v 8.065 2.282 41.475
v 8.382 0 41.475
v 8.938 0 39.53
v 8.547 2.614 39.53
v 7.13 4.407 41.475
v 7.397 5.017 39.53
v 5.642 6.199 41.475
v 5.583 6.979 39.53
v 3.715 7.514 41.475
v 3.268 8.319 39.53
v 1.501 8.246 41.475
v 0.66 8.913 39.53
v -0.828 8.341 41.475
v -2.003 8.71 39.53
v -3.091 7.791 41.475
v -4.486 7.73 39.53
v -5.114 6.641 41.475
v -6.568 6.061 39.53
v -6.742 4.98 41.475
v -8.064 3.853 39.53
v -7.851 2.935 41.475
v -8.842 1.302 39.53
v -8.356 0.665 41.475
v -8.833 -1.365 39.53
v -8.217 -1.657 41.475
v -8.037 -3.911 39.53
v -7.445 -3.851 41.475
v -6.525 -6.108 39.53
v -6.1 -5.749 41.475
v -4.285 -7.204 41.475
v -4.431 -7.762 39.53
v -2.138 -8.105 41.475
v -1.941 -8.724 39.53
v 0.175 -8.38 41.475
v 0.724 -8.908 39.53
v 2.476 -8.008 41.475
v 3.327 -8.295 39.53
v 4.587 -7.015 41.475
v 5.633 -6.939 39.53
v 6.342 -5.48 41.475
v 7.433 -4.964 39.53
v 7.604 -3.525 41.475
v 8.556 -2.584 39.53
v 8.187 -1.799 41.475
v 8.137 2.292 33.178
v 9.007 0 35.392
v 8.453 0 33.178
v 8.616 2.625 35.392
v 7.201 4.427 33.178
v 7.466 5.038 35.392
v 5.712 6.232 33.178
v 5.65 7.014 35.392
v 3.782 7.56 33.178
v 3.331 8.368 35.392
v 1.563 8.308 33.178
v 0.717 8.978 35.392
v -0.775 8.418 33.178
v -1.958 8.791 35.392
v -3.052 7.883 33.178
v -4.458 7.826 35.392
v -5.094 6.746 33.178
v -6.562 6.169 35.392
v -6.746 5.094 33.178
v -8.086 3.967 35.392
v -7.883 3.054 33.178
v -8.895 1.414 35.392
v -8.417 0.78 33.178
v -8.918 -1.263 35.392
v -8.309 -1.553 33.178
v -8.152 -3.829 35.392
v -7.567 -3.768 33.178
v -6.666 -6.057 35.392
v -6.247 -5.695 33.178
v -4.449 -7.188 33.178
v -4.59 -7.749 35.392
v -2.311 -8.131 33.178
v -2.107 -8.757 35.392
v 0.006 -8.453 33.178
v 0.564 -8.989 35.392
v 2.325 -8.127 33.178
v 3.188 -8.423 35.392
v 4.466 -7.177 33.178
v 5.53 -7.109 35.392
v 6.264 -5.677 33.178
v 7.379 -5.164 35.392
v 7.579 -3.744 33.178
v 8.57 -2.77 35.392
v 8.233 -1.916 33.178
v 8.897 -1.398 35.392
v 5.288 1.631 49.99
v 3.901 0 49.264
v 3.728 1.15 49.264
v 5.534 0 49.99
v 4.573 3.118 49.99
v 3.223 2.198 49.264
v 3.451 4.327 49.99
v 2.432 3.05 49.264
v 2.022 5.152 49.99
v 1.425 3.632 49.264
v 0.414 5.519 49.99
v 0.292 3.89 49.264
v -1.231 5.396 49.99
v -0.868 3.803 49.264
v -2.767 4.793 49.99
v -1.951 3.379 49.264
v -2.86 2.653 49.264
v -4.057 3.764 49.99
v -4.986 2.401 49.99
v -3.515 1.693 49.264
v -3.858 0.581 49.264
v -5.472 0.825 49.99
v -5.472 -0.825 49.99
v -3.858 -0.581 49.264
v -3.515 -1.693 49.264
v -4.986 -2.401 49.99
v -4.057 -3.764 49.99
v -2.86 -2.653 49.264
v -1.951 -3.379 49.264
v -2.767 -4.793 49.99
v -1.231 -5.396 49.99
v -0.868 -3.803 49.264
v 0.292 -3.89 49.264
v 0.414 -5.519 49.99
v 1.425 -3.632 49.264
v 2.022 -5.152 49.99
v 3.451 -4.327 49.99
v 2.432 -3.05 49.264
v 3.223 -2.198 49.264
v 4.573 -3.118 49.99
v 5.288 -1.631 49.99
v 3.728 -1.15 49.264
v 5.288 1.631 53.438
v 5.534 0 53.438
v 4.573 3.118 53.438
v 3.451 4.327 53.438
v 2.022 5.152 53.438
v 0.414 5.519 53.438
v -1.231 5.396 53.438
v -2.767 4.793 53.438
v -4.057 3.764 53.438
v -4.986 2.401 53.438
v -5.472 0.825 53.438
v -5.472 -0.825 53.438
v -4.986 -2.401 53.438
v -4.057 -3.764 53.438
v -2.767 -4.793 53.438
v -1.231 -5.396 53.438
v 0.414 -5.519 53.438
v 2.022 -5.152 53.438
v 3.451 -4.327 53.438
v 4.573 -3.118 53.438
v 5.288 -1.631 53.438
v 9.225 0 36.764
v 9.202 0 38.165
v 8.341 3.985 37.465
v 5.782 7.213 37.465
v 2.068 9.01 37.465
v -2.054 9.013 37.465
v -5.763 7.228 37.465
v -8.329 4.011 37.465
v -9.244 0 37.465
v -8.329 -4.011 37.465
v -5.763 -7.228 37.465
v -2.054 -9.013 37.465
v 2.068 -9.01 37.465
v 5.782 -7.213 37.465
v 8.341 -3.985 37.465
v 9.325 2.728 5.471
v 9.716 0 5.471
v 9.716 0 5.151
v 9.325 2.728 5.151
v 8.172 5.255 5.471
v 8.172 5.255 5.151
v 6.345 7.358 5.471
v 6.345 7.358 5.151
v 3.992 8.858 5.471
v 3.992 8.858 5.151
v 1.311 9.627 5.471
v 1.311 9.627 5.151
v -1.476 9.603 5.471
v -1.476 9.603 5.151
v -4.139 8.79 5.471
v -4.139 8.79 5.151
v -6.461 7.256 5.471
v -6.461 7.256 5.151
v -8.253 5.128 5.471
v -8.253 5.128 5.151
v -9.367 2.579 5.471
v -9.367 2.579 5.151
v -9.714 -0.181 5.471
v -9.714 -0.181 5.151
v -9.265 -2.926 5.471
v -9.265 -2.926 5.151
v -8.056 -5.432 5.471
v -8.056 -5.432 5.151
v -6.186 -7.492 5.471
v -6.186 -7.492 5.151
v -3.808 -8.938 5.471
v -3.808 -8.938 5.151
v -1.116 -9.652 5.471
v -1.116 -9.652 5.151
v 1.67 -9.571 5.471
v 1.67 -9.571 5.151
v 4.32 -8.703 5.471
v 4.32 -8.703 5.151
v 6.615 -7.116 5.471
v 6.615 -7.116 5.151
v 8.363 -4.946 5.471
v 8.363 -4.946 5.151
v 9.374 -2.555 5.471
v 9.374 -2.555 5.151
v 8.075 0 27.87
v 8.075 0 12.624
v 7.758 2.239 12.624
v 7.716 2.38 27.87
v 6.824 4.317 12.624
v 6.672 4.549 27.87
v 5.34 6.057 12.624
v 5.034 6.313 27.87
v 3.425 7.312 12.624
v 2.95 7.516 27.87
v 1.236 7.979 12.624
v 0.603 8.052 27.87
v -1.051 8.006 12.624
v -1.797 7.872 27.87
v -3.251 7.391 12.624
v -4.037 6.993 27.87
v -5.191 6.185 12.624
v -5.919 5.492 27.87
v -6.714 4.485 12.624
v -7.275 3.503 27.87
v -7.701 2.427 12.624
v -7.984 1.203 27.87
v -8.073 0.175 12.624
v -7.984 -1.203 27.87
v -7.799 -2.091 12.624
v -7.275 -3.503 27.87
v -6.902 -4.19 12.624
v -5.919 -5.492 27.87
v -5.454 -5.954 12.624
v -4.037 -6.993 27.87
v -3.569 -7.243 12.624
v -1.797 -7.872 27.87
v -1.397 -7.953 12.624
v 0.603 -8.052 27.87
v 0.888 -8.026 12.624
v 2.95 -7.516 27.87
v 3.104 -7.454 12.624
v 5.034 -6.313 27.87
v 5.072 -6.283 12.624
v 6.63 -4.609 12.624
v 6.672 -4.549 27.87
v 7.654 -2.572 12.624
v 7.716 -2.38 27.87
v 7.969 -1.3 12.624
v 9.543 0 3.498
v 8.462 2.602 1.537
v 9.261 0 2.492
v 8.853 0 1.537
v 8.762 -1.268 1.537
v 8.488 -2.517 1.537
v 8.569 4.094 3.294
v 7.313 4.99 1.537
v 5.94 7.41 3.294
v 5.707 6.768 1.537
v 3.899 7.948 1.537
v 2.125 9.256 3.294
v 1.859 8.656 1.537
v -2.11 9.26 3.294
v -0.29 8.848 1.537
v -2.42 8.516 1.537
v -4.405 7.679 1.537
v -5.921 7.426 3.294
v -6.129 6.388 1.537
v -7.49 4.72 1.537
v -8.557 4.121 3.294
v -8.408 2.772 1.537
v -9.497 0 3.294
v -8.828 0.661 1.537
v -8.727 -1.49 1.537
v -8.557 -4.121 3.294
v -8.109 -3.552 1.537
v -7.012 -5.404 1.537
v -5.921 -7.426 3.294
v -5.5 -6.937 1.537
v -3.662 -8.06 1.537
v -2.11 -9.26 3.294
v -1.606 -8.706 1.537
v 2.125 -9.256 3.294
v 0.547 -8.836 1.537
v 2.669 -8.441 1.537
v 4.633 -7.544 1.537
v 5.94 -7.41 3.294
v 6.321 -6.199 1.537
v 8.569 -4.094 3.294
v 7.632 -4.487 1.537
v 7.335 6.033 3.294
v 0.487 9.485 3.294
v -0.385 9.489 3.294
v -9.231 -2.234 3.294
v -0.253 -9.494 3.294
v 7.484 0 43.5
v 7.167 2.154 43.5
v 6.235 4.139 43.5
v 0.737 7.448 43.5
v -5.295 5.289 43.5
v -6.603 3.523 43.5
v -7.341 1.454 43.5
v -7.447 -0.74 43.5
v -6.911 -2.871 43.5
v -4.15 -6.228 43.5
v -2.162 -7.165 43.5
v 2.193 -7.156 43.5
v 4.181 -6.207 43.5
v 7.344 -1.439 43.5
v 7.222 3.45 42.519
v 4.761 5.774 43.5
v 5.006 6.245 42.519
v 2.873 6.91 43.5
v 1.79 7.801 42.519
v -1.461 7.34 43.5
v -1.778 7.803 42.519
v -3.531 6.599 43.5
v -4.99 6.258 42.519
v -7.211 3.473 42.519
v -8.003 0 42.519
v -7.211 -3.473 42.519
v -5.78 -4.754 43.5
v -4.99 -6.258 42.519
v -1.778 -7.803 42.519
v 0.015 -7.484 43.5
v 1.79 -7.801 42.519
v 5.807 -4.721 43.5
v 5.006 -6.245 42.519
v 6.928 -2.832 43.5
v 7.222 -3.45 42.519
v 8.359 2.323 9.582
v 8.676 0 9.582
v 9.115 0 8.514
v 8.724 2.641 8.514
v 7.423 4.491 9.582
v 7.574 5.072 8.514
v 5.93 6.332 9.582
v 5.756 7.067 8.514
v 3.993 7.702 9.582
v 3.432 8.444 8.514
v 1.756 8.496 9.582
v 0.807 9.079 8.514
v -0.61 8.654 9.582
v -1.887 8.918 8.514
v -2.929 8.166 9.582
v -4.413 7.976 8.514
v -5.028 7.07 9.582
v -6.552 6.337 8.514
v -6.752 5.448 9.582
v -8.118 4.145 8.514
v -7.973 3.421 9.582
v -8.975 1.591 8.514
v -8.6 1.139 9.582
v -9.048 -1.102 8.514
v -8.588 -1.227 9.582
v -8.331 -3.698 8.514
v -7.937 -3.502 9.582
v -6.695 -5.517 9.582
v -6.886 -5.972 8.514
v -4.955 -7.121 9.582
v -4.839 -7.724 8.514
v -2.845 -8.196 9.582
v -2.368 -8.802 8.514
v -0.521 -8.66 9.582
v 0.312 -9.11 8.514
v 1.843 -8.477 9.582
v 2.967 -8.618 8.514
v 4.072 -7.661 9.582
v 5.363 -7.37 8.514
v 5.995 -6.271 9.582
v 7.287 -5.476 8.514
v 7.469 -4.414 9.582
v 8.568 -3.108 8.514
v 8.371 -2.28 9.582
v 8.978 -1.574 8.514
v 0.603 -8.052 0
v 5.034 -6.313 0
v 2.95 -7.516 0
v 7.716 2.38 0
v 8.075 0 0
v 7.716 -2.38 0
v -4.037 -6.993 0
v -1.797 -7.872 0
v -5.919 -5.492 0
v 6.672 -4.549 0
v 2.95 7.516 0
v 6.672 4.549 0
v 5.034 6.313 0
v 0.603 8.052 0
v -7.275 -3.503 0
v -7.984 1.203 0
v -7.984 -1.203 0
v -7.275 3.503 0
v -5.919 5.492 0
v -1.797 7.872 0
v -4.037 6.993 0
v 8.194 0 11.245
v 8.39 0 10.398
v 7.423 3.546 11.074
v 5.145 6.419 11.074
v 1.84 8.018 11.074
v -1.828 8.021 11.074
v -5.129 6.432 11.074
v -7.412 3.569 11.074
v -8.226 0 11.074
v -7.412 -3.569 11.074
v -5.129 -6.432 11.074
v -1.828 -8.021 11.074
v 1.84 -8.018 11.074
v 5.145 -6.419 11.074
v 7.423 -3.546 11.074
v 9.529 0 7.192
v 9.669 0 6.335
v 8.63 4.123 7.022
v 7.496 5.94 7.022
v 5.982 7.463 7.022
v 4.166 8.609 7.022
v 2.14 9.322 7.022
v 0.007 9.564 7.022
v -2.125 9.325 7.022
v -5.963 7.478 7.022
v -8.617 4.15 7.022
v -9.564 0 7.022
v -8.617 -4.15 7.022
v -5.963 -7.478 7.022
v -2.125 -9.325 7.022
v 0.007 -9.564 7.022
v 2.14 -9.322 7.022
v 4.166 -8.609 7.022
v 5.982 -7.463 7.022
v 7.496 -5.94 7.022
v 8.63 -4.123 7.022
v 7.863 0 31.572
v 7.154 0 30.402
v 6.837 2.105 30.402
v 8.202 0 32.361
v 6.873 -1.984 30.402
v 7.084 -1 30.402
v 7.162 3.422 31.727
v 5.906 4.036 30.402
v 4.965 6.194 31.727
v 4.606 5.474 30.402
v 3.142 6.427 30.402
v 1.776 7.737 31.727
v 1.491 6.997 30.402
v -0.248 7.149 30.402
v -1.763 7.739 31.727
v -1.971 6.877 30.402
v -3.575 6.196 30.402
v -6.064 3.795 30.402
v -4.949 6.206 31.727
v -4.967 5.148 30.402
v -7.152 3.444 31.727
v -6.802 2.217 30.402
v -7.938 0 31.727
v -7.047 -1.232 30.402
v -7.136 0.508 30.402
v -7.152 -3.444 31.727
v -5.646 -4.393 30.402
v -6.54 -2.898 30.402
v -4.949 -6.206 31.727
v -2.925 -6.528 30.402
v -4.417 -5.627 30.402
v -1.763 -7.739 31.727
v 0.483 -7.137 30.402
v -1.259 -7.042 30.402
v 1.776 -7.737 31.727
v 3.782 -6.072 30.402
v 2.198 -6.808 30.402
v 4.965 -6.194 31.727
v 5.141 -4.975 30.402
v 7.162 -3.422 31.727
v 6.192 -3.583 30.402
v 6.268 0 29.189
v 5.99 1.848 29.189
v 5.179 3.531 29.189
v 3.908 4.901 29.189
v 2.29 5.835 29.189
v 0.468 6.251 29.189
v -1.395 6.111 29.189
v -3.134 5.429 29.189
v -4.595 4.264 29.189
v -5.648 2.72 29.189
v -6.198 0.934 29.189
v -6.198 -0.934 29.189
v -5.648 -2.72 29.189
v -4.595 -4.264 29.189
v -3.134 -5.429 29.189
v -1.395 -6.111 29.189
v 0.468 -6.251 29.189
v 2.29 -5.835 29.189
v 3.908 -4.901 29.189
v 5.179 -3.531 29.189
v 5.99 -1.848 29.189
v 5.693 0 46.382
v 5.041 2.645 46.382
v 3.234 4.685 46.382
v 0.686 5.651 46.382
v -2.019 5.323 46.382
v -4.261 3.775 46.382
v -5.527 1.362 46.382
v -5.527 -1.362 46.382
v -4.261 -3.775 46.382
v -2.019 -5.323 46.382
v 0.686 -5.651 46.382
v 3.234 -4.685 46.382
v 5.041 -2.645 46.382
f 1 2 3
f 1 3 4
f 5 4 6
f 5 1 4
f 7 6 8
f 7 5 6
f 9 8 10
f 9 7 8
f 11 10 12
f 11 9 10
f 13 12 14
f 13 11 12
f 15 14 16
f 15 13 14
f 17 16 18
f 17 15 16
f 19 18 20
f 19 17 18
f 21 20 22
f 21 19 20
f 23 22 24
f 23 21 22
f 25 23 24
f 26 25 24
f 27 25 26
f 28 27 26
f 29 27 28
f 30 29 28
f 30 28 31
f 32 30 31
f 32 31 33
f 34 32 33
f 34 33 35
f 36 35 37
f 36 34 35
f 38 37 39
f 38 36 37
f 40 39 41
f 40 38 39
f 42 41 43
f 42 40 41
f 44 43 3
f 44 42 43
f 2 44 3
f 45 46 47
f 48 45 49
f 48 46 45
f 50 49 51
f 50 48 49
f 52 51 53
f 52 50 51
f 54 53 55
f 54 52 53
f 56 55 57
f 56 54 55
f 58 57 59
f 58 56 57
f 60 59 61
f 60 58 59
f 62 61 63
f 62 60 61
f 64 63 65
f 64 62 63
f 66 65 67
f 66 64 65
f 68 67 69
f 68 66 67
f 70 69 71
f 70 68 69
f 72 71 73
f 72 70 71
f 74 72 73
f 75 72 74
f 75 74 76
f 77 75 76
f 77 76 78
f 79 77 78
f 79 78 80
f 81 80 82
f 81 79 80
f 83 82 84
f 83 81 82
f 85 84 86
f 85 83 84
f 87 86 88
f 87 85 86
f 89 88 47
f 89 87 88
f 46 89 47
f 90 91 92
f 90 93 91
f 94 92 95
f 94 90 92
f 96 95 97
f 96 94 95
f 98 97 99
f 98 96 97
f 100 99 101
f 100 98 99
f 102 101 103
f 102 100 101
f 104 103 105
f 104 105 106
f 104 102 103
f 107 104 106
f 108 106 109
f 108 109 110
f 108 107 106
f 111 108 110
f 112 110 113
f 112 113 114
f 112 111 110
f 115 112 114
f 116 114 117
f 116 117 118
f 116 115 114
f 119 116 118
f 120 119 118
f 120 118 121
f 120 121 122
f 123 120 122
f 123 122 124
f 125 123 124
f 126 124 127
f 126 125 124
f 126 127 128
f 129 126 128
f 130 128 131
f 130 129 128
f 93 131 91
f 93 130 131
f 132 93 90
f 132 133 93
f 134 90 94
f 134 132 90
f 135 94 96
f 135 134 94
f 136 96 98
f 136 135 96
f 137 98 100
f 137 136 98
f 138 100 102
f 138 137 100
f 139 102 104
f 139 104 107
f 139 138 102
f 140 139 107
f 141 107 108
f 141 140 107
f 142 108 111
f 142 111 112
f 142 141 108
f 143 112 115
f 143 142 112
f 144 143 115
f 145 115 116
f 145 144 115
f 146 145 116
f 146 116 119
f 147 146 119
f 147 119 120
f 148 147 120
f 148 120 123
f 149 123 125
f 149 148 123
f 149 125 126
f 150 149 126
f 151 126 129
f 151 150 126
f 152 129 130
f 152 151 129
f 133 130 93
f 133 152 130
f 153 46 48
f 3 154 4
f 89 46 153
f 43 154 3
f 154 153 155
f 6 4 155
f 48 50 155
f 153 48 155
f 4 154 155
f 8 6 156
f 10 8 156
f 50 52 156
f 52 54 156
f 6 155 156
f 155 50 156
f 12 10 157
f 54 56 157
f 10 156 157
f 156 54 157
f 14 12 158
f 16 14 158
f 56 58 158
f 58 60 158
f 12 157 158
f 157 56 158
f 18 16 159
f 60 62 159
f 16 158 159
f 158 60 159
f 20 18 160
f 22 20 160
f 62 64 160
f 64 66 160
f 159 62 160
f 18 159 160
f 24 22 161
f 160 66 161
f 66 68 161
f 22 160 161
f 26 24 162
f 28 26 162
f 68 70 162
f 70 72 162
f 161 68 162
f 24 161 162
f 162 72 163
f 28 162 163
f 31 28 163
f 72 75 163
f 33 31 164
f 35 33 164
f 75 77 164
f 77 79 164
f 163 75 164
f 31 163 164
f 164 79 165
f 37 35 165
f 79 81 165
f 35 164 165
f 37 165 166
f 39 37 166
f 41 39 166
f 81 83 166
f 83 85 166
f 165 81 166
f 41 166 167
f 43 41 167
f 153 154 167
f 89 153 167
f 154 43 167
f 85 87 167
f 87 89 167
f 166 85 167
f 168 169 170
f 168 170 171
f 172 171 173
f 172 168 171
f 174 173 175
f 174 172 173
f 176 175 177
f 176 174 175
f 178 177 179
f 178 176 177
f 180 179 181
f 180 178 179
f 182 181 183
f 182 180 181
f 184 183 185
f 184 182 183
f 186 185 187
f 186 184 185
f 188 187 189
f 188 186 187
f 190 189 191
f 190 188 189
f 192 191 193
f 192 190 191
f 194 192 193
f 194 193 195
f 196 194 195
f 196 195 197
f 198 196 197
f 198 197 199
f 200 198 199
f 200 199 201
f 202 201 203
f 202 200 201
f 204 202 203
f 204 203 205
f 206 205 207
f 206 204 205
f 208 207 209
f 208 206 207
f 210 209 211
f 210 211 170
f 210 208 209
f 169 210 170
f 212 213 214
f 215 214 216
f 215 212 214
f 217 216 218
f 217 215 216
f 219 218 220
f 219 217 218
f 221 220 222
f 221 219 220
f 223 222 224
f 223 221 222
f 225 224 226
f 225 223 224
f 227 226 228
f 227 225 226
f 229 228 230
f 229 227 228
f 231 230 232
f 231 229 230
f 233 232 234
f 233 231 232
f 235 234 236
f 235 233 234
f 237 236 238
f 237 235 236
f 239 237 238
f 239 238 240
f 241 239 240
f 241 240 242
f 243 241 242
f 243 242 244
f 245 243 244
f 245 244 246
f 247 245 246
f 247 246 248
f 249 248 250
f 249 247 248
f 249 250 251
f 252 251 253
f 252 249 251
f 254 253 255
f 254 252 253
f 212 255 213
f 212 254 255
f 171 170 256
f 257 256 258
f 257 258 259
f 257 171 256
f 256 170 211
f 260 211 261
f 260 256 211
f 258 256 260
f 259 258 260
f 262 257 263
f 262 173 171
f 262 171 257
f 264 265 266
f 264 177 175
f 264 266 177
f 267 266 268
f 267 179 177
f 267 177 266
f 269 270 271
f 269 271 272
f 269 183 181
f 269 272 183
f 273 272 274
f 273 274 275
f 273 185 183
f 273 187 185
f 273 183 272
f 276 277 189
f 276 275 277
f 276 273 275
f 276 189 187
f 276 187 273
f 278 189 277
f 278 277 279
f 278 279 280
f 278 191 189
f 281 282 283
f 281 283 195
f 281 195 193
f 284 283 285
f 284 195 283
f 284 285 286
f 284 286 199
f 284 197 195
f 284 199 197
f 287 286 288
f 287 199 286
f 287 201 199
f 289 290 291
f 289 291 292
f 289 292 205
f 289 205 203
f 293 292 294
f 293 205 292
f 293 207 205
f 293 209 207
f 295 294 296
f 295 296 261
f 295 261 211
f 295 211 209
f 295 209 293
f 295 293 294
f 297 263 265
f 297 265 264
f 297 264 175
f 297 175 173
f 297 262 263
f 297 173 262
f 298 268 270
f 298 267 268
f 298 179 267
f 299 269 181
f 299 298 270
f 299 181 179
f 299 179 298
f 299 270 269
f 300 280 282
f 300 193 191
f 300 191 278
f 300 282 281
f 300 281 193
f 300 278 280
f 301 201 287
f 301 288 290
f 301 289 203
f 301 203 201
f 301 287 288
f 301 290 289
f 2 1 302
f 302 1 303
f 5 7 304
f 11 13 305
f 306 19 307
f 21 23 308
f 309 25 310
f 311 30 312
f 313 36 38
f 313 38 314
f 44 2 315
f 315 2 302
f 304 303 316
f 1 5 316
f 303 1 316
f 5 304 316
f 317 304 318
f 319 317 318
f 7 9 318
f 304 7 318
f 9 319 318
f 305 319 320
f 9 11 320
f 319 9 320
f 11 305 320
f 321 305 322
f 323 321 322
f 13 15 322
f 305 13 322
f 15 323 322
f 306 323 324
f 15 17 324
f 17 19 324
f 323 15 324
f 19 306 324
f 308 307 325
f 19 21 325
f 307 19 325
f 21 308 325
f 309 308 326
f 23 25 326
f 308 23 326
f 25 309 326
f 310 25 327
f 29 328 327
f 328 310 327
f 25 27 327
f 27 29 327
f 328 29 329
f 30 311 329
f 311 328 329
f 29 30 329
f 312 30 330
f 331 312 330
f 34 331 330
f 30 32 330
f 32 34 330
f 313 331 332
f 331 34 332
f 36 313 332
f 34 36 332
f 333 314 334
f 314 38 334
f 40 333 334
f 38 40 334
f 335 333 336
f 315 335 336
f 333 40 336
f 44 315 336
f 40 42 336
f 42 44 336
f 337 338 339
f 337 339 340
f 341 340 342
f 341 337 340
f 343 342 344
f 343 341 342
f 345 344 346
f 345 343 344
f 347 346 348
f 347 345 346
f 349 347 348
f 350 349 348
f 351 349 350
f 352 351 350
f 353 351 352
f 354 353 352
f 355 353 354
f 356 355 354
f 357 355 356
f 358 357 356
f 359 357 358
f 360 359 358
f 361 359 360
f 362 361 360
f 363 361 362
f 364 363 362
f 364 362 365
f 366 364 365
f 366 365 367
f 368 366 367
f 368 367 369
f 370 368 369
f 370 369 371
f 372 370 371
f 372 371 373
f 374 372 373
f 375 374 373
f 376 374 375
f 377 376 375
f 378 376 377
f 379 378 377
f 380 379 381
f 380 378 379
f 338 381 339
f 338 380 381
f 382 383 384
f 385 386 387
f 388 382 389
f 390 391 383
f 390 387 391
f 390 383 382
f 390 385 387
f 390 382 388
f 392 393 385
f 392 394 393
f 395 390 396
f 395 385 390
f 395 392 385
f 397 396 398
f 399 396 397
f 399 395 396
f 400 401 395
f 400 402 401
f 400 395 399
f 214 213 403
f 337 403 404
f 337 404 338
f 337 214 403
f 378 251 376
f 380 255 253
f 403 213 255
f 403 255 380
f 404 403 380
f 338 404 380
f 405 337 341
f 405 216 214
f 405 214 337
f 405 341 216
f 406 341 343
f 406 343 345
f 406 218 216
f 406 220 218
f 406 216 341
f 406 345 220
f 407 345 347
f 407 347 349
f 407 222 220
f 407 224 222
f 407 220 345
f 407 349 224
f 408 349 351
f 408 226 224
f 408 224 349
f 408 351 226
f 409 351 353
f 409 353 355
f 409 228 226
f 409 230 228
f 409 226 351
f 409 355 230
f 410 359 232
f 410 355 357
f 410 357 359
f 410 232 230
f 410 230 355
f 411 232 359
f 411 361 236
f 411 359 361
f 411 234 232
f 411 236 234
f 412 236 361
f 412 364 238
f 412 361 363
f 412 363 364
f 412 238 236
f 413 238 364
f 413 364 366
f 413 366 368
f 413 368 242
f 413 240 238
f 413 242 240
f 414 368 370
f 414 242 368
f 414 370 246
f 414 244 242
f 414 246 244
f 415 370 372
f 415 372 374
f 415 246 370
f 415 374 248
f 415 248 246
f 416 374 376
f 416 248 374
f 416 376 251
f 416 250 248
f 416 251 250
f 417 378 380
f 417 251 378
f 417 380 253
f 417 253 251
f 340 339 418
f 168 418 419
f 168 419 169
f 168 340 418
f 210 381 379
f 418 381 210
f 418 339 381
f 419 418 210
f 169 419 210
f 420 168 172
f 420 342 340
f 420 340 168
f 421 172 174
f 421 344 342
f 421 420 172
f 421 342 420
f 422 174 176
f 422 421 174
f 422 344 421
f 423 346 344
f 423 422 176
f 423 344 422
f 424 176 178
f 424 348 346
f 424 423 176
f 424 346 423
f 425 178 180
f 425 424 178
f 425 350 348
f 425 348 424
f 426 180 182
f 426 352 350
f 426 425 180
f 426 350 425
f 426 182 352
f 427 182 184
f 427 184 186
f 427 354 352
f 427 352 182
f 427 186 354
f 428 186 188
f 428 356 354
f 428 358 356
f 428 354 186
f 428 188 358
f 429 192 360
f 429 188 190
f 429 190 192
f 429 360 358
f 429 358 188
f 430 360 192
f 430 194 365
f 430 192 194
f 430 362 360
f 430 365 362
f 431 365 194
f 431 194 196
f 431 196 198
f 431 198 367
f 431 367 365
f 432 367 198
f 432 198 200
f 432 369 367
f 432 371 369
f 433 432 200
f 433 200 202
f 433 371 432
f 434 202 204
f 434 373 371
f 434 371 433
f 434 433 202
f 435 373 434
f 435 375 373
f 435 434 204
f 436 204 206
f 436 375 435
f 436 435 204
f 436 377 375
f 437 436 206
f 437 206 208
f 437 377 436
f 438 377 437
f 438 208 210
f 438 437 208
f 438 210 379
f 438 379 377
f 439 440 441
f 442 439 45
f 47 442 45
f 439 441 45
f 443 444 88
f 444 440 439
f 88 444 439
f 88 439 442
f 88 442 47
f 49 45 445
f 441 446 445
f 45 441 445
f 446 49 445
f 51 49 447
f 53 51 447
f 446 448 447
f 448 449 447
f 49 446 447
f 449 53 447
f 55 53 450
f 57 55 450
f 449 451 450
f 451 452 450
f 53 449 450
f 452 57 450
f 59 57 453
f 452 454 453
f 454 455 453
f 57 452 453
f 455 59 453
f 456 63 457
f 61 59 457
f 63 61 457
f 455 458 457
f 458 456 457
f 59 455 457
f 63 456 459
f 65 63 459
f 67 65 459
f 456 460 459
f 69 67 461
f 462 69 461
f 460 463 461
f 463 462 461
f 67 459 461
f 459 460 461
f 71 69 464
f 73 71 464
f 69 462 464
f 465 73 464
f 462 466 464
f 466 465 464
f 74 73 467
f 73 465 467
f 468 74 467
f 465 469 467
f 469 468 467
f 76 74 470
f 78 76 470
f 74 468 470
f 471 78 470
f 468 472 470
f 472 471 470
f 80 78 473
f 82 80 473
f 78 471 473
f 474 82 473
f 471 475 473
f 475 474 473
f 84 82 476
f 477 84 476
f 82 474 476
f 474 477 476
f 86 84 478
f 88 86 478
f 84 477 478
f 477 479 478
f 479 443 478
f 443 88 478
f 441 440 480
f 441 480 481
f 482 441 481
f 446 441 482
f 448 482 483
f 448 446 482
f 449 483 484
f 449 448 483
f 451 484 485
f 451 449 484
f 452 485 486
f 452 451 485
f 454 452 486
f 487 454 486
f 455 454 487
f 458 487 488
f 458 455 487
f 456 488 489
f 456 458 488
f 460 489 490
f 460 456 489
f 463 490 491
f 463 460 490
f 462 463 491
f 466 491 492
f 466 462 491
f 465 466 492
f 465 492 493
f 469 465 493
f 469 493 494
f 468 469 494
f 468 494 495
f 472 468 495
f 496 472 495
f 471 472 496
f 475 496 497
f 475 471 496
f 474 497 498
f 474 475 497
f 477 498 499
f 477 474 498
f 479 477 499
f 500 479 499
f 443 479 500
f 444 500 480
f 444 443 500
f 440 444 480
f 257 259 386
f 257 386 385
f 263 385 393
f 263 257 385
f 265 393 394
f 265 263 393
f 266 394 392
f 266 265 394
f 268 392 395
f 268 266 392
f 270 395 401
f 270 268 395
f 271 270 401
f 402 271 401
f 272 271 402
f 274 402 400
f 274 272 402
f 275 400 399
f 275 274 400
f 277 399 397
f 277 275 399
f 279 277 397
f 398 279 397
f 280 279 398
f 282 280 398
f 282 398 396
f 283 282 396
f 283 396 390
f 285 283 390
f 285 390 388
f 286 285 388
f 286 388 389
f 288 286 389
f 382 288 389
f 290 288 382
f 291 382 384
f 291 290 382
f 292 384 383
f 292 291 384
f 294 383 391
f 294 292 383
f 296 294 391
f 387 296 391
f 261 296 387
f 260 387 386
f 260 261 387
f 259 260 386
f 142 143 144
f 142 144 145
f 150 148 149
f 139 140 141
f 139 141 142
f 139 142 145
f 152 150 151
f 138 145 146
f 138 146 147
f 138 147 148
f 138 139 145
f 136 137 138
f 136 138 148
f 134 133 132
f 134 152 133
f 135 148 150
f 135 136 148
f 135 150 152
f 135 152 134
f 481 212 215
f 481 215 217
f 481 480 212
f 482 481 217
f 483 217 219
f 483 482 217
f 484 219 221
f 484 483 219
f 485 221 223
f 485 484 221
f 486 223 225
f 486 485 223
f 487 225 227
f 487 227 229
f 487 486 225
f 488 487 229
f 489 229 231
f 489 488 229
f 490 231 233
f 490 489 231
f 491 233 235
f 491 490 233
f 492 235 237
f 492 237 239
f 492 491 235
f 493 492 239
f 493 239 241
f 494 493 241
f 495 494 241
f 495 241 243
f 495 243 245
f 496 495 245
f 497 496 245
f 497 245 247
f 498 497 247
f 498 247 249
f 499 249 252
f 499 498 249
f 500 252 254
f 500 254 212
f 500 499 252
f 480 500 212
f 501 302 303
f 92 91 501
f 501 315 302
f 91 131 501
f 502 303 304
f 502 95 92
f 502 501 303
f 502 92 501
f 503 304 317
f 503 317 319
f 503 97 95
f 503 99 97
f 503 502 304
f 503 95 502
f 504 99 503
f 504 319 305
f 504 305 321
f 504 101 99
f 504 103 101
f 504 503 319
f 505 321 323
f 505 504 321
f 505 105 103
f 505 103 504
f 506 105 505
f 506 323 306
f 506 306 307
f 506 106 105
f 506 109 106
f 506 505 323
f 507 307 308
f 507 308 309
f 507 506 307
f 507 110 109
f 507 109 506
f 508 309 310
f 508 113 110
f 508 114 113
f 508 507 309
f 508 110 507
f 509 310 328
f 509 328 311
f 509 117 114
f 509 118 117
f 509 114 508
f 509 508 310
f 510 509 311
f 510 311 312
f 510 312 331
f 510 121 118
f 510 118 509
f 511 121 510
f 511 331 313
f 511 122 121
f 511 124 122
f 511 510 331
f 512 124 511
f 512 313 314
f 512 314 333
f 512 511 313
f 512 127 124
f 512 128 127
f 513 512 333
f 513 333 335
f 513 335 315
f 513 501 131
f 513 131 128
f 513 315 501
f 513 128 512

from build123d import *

# Parameters (mm, degrees)
F2_R = 8
F3_R = 8


with BuildPart() as f1:
    # F0 (on Front) → F1 (revolve)
    with BuildSketch(Plane.XZ):
        Polygon((5.534274, 53.437501), (0, 53.437501), (0, 0), (8.074597, 0), (9.715894, 3.241377), (9.715894, 7.051861), (8.074597, 11.043796), (8.074597, 27.870369), (6.268315, 29.188959), (8.074597, 31.66331), (9.526211, 37.46976), (8.074597, 42.550407), (3.901211, 49.264114), (5.534274, 49.98992), align=None)
    revolve(axis=Axis((0, 0, 26.718751), (0, 0, 1)))

    # F2
    f2_edges = [f1.edges().sort_by_distance(p)[0] for p in [
        (-8.074597, 0, 42.550407),
        (-9.526211, 0, 37.46976),
        (-8.074597, 0, 31.66331),
    ]]
    fillet(f2_edges, radius=F2_R)

    # F3
    f3_edges = [f1.edges().sort_by_distance(p)[0] for p in [
        (-8.074597, 0, 11.043796),
        (-9.715894, 0, 7.051861),
        (-9.715894, 0, 3.241377),
    ]]
    fillet(f3_edges, radius=F3_R)


solid = f1.part
